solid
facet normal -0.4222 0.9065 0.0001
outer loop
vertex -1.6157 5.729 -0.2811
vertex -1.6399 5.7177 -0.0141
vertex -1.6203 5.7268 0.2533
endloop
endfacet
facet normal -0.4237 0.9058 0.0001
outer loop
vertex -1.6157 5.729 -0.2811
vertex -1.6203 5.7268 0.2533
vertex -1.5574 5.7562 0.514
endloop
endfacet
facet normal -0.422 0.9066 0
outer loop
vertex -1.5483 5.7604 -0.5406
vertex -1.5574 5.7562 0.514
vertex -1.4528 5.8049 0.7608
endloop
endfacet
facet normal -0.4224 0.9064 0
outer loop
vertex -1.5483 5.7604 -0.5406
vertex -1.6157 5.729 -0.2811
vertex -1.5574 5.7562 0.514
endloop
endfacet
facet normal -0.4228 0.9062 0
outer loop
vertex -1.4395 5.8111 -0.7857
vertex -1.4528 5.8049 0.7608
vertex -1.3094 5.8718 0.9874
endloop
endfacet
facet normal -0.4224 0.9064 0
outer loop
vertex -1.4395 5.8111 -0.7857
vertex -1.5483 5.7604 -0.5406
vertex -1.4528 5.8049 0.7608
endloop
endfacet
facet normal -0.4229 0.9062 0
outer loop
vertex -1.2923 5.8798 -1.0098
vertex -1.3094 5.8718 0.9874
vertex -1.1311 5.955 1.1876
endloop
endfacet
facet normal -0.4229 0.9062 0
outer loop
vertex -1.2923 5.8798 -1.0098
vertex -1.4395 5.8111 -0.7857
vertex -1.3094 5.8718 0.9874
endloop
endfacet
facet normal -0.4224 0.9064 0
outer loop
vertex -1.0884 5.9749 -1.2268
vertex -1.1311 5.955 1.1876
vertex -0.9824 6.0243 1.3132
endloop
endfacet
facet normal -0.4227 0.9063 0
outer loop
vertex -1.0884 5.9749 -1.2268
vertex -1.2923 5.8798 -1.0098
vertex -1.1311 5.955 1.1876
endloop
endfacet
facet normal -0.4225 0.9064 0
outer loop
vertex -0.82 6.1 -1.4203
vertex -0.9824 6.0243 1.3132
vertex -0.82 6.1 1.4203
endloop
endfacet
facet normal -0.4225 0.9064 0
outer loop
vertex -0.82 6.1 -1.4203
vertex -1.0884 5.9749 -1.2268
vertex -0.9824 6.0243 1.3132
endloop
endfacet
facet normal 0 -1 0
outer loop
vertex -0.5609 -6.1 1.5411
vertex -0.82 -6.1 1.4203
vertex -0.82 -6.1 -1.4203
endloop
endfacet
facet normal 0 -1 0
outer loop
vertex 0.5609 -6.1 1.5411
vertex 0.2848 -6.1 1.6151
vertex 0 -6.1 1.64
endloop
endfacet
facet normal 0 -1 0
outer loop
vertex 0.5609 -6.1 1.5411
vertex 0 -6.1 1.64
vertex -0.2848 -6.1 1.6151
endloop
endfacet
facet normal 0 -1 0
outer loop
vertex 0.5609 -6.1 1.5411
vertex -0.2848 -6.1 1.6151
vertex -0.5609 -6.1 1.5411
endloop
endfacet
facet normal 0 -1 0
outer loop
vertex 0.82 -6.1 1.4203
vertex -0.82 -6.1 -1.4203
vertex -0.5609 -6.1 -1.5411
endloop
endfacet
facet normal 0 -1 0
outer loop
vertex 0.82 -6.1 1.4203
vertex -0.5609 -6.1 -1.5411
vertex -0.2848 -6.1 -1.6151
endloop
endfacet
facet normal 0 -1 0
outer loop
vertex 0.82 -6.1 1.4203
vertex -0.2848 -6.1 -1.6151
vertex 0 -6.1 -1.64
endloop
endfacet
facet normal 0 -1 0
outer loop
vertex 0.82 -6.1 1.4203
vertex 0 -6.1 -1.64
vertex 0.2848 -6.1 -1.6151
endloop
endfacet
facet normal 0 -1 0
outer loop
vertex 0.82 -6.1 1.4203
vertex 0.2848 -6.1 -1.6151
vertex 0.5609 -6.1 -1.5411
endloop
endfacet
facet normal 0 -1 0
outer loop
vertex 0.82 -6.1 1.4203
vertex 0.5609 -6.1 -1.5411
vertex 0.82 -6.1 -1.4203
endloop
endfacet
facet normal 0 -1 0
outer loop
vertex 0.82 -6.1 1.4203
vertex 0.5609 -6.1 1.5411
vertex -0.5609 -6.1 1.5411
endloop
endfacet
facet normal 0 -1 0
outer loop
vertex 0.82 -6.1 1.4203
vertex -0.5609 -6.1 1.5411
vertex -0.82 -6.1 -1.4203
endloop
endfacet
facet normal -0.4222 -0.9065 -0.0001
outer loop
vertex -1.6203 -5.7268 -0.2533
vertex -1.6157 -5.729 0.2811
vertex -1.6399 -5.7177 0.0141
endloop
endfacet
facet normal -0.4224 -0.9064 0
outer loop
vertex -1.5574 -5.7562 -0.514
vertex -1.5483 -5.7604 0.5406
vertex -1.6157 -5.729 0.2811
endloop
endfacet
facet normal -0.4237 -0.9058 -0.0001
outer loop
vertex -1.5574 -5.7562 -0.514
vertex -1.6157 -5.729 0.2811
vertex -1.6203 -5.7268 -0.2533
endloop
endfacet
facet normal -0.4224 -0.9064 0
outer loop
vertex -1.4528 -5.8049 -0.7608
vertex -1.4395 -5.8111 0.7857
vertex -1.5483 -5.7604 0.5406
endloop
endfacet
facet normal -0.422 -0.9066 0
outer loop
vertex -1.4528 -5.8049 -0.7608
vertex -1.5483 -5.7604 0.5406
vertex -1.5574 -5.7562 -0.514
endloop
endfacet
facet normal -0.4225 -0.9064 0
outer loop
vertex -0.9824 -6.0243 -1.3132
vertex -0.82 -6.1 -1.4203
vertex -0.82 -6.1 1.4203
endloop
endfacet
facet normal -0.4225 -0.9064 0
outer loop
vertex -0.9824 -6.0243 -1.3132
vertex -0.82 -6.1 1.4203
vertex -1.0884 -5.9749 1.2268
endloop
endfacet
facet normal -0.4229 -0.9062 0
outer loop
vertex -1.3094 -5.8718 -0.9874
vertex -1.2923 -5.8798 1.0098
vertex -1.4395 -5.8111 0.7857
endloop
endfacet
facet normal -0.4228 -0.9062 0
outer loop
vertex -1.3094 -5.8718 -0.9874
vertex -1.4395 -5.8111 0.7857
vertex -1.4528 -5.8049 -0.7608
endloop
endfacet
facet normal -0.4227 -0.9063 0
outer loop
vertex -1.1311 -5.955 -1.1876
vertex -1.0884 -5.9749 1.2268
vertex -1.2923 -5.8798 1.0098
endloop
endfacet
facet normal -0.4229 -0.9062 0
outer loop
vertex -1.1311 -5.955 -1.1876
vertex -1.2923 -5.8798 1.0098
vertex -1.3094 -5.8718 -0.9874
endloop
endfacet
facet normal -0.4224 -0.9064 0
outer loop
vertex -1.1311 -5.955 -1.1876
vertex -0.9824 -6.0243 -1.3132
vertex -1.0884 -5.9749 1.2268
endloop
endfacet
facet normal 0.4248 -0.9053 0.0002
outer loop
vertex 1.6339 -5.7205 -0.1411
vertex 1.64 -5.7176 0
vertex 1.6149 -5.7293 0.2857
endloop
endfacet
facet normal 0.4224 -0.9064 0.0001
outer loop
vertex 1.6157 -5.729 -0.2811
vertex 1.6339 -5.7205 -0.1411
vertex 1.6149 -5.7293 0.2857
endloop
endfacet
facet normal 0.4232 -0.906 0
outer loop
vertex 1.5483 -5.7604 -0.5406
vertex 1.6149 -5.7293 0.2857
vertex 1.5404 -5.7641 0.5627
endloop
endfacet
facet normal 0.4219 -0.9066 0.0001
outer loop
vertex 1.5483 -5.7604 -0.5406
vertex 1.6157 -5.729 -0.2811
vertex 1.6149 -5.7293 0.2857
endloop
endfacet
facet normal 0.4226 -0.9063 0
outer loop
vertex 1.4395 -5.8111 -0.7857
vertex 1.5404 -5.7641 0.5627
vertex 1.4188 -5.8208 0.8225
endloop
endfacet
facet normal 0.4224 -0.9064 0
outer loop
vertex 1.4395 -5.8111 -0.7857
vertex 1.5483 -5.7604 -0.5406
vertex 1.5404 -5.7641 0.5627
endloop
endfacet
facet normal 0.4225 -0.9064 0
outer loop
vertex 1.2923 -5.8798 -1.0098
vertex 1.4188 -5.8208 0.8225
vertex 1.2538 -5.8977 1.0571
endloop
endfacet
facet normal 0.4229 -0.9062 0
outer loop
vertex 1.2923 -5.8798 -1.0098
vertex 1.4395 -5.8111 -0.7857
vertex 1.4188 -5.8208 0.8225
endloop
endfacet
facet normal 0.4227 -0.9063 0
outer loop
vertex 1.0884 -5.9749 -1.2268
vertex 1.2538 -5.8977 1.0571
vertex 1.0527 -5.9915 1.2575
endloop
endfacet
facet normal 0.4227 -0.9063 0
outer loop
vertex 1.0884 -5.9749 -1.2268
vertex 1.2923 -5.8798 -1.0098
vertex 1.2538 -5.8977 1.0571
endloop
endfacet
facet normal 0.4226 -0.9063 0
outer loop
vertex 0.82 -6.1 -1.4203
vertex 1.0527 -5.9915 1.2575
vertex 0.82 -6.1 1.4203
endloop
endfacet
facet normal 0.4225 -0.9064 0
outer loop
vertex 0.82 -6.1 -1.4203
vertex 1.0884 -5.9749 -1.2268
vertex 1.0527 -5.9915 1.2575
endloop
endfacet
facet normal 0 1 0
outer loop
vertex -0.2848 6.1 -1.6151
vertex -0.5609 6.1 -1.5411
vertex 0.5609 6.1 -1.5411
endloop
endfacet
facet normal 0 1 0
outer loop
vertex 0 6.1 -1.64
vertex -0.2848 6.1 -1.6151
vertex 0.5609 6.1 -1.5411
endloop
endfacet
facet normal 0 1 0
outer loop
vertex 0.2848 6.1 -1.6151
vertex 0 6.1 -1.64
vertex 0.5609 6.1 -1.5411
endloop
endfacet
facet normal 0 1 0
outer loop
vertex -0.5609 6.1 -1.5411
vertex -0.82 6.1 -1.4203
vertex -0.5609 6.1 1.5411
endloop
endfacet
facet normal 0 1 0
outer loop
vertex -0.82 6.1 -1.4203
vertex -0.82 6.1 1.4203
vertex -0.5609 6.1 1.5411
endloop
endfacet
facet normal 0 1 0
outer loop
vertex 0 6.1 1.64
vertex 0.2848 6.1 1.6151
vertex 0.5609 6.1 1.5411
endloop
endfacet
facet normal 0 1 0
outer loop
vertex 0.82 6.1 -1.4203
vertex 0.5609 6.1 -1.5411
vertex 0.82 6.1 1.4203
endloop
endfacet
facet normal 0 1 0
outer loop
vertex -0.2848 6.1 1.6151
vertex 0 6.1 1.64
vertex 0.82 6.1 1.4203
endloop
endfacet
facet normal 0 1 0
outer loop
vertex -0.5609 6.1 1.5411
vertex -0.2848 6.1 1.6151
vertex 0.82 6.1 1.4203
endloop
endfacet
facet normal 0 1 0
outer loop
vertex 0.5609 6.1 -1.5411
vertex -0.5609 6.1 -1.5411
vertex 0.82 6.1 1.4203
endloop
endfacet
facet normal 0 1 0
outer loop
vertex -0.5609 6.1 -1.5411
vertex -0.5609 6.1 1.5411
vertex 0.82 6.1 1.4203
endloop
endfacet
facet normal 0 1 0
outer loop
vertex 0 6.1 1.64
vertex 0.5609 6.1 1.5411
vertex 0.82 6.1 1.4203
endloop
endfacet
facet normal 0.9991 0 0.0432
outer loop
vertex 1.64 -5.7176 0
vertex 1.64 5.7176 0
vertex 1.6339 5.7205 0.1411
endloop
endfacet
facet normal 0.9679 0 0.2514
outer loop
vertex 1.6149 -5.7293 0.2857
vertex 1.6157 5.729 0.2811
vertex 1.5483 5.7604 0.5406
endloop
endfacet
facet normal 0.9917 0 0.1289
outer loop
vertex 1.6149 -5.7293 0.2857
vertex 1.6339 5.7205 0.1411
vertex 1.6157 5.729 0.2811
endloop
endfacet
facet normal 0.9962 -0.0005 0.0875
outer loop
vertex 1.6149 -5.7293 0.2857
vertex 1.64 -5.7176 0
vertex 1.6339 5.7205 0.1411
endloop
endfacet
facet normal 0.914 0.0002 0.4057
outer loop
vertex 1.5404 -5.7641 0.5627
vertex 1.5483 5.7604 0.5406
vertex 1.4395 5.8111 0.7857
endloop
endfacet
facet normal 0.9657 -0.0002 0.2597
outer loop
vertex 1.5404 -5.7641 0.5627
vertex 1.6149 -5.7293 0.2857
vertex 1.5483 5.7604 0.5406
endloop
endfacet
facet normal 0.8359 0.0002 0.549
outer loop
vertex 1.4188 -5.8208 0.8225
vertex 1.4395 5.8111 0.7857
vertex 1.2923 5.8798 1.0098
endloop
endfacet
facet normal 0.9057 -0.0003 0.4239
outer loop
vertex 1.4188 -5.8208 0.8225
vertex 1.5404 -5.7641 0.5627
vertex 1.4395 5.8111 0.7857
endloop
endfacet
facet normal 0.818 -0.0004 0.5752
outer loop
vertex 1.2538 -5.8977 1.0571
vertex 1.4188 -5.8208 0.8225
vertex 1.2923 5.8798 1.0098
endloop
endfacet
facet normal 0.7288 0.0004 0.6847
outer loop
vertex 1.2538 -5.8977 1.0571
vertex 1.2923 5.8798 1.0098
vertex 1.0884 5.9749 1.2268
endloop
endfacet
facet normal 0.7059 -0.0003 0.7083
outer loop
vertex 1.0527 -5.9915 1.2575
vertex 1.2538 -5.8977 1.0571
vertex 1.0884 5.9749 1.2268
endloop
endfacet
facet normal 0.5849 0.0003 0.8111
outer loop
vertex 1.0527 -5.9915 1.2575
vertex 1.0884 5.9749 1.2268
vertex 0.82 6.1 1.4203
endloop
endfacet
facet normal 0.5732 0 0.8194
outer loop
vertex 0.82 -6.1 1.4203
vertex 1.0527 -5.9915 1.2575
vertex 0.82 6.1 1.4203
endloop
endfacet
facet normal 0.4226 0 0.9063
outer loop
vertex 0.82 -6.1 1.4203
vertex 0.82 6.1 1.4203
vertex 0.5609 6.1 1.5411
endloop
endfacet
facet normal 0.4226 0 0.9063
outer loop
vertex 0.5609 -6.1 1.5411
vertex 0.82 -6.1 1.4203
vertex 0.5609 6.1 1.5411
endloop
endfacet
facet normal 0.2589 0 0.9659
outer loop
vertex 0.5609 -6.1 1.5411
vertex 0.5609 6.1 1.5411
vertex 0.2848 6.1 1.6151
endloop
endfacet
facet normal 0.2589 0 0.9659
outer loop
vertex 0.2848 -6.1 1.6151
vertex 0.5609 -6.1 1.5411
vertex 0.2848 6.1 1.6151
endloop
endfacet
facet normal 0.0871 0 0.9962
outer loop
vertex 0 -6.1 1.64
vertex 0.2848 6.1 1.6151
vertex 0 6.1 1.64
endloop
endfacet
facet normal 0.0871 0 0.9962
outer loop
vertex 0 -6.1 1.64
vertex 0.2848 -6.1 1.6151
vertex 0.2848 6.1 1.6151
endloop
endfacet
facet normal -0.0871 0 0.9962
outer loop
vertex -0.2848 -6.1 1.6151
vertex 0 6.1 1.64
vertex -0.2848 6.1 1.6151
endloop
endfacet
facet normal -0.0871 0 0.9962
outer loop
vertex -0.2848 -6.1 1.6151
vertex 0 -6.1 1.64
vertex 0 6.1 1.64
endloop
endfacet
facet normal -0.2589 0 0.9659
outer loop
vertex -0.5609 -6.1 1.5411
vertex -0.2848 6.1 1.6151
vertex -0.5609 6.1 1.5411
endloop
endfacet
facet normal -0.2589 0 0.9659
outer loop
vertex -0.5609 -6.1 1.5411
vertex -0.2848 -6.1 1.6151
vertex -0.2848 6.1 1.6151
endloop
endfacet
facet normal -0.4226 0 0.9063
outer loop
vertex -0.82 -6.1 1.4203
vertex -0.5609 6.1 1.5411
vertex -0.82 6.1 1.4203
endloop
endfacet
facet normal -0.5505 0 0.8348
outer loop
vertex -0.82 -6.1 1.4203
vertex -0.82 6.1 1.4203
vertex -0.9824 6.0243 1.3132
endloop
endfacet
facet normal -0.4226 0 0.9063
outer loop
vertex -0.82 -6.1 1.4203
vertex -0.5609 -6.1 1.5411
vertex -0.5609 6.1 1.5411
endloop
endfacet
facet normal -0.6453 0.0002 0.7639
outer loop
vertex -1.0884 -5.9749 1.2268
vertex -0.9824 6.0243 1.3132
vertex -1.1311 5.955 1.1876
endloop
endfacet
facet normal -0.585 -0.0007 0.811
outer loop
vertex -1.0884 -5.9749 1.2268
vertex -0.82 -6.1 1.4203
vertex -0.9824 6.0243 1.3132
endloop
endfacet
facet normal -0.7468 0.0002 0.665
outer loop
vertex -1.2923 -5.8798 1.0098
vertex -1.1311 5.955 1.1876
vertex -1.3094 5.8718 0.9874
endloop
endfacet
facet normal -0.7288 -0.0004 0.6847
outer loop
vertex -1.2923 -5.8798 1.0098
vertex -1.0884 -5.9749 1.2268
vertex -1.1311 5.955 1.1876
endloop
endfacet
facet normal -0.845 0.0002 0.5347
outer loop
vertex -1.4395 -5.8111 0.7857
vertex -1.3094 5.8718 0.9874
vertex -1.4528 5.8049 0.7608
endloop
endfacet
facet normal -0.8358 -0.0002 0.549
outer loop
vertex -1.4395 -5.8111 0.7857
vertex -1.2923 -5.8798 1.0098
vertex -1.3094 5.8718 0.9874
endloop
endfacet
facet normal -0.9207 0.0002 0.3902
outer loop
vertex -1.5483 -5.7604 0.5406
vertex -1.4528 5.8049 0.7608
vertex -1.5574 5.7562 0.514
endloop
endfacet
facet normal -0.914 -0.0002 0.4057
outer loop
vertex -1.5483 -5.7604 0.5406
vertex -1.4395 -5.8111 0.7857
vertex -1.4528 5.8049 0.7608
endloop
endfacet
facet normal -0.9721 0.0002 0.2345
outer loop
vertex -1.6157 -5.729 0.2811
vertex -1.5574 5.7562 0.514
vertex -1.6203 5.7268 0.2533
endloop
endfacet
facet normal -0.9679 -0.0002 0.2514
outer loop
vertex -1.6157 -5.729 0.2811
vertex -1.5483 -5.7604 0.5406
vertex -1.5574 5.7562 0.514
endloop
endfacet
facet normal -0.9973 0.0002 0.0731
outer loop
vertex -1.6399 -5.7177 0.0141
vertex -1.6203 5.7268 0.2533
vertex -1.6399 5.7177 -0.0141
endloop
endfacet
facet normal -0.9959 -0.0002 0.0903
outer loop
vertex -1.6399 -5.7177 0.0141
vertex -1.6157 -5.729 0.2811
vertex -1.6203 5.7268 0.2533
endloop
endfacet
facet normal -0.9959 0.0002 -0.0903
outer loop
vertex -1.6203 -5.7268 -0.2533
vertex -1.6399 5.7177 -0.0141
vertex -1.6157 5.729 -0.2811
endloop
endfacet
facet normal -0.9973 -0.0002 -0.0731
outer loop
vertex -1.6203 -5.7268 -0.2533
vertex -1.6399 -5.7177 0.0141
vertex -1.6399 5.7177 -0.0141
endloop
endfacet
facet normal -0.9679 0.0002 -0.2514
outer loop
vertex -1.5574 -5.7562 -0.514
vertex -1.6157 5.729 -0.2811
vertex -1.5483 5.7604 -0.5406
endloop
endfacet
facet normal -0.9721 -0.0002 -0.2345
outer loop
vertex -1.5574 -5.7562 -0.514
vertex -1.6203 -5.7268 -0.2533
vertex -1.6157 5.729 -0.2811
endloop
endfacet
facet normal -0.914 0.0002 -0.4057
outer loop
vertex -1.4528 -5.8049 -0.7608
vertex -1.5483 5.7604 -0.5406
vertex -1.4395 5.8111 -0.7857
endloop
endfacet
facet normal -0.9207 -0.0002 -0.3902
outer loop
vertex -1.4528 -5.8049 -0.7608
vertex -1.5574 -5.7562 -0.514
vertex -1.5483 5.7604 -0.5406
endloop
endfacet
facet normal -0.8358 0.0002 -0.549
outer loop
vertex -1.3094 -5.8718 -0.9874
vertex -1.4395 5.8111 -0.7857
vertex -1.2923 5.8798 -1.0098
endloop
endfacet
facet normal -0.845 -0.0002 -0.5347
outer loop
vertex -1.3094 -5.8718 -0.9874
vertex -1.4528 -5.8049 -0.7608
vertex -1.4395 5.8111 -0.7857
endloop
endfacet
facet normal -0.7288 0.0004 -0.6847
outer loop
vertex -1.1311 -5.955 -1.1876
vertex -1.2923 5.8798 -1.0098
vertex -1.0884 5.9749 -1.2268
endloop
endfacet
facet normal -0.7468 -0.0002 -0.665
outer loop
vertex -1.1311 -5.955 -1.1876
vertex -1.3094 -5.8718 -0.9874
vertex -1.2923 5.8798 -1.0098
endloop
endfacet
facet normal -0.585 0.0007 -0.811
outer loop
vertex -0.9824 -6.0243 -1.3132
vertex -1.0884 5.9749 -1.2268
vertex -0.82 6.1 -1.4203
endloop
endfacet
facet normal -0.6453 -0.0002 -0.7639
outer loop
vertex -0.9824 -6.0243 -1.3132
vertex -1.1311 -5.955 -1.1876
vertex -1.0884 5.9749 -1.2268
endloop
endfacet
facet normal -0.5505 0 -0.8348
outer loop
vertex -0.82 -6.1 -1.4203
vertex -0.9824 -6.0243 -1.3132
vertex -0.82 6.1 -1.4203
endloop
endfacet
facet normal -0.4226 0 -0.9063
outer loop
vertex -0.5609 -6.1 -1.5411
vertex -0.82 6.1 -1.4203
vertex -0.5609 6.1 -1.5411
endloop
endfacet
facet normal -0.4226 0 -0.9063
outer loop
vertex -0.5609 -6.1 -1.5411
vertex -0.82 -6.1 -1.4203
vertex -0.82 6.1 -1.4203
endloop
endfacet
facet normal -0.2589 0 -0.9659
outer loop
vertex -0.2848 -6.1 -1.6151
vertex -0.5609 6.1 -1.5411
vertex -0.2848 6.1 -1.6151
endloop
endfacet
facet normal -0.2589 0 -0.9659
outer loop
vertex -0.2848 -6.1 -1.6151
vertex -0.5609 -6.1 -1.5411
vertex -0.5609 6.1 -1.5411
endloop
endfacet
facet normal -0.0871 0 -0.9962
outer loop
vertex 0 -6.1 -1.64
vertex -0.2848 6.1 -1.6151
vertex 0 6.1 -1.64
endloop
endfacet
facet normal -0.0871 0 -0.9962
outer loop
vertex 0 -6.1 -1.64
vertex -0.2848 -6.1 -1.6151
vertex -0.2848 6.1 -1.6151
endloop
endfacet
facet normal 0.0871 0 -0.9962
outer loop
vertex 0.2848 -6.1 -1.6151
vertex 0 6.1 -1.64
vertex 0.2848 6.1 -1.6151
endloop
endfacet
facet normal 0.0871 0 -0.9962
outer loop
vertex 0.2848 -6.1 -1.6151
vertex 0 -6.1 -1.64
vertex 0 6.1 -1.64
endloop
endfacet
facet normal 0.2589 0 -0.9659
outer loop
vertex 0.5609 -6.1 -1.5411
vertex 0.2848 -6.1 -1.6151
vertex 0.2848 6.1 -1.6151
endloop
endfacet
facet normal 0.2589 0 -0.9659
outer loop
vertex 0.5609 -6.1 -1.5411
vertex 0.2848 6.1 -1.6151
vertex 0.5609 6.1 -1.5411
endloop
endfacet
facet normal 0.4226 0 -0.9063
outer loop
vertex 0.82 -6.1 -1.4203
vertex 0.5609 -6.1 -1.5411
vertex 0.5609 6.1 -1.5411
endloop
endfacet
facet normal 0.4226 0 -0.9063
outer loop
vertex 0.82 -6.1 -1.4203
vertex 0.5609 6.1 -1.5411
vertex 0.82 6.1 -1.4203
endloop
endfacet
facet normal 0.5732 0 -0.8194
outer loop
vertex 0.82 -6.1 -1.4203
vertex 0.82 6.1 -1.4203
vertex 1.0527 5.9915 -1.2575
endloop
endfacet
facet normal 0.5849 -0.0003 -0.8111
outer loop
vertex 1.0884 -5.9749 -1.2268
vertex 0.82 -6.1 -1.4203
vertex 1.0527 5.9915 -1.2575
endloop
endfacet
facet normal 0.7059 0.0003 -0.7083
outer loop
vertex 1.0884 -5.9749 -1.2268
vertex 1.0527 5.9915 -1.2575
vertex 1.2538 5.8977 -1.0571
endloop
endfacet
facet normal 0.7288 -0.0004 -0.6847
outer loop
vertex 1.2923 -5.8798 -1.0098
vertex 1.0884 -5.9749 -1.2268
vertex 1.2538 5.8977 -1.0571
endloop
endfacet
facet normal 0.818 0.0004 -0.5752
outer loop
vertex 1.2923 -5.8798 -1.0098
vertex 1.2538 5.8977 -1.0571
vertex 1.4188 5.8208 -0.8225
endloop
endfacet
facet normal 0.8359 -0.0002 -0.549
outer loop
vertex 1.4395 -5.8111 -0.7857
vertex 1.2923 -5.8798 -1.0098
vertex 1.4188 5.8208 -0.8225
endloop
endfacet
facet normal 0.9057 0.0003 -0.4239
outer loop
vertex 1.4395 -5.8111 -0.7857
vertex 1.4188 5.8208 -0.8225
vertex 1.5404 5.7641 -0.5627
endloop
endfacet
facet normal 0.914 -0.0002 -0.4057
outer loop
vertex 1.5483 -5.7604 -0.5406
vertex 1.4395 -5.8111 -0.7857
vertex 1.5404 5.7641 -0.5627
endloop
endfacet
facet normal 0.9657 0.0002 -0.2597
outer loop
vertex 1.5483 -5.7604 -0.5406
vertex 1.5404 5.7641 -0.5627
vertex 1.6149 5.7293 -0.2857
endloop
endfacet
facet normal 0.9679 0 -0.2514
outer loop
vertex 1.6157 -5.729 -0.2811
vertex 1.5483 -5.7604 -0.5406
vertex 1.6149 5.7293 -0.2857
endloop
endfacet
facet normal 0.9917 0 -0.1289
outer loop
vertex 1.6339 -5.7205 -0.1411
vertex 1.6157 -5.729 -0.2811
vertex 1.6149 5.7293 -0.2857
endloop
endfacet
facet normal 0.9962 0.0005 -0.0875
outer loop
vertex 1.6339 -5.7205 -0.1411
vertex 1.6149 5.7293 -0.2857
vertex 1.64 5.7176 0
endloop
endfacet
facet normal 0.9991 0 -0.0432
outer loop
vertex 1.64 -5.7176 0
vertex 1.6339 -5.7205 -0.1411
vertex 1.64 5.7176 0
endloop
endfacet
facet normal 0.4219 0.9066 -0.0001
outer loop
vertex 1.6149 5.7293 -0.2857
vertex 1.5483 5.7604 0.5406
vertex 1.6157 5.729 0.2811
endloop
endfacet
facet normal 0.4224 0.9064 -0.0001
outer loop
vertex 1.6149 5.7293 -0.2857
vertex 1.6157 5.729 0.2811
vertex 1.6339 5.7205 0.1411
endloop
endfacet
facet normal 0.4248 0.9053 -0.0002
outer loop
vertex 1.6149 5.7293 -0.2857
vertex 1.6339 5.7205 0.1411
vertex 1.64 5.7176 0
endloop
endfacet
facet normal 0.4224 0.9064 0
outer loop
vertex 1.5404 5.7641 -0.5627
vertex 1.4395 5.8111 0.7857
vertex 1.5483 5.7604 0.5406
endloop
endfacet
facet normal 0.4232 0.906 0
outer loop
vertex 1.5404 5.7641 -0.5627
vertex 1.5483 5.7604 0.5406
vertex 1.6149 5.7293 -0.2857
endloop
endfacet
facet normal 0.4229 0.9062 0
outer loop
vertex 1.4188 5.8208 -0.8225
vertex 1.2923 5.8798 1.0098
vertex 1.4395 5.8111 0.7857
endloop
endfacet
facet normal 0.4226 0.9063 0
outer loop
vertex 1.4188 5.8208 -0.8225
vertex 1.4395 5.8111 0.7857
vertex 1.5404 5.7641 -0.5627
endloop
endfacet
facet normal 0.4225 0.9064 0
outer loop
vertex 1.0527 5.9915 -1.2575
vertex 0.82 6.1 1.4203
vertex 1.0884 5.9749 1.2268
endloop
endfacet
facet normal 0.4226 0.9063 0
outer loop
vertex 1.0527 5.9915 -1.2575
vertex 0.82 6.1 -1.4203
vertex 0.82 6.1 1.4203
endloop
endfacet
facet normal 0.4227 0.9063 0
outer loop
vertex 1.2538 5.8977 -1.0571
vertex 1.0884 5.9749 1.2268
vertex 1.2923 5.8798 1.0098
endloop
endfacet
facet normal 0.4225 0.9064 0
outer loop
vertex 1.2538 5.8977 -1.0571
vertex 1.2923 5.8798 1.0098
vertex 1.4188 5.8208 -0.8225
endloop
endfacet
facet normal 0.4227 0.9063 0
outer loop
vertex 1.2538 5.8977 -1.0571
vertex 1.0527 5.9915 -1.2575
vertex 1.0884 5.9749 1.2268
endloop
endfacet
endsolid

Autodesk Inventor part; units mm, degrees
sketch "Sketch_1" plane through (0, 0, 0) normal (0, 0, 1) x (1, 0, 0)
  line L0 (0, -6.1) -> (0, 6.1)
  line L1 (0, 6.1) -> (1.64, 6.1)
  line L2 (1.64, 6.1) -> (1.64, -6.1)
  line L3 (1.64, -6.1) -> (0, -6.1)
  line L4 (0, -6.1) -> (0, 6.1)
revolve "Revolution1" add sketch "Sketch_1" angle 360 about axis through (0, -6.1, 0) along (0, -1, 0)
sketch "Sketch_7" plane through (0, 0, 0) normal (0, 0, 1) x (1, 0, 0)
  line L0 (0.82, 6.1) -> (2.46, 5.3353)
  line L1 (2.46, 5.3353) -> (2.46, 6.92)
  line L2 (2.46, 6.92) -> (0.82, 6.92)
  line L3 (0.82, 6.92) -> (0.82, 6.1)
extrude "Extrusion1" cut sketch "Sketch_7" along normal mid plane 3.28
sketch "Sketch_8" plane through (0, 0, 0) normal (0, 0, 1) x (1, 0, 0)
  line L0 (-2.46, 6.92) -> (-2.46, 5.3353)
  line L1 (-2.46, 5.3353) -> (-0.82, 6.1)
  line L2 (-0.82, 6.1) -> (-0.82, 6.92)
  line L3 (-0.82, 6.92) -> (-2.46, 6.92)
extrude "Extrusion2" cut sketch "Sketch_8" along normal mid plane 3.28
sketch "Sketch_9" plane through (0, 0, 0) normal (0, 0, 1) x (1, 0, 0)
  line L0 (0.82, -6.1) -> (0.82, -6.92)
  line L1 (0.82, -6.92) -> (2.46, -6.92)
  line L2 (2.46, -6.92) -> (2.46, -5.3353)
  line L3 (2.46, -5.3353) -> (0.82, -6.1)
extrude "Extrusion3" cut sketch "Sketch_9" along normal mid plane 3.28
sketch "Sketch_10" plane through (0, 0, 0) normal (0, 0, 1) x (1, 0, 0)
  line L0 (-2.46, -6.92) -> (-0.82, -6.92)
  line L1 (-0.82, -6.92) -> (-0.82, -6.1)
  line L2 (-0.82, -6.1) -> (-2.46, -5.3353)
  line L3 (-2.46, -5.3353) -> (-2.46, -6.92)
extrude "Extrusion4" cut sketch "Sketch_10" along normal mid plane 3.28
ref_plane "Body2_1_XY" through (0, 0, 0) normal (0, 1, 0) x (1, 0, 0)
ref_plane "Body2_1_YZ" through (0, 0, 0) normal (1, 0, 0) x (0, 0, -1)
ref_plane "Body2_1_ZX" through (0, 0, 0) normal (0, 0, -1) x (0, 1, 0)
ref_plane "for_pin_XY" through (0, -5.3803, 0) normal (1, 0, 0) x (0, 0, -1)
ref_plane "for_pin_YZ" through (0, -5.3803, 0) normal (0, 0, -1) x (0, 1, 0)
ref_plane "for_pin_ZX" through (0, -5.3803, 0) normal (0, 1, 0) x (1, 0, 0)
ref_plane "to_dummy_1_XY" through (0, 0, 0) normal (0, -1, 0) x (1, 0, 0)
ref_plane "to_dummy_1_YZ" through (0, 0, 0) normal (1, 0, 0) x (0, 0, 1)
ref_plane "to_dummy_1_ZX" through (0, 0, 0) normal (0, 0, 1) x (0, -1, 0)
properties part number "06B - 1 RP- Pin 1"
